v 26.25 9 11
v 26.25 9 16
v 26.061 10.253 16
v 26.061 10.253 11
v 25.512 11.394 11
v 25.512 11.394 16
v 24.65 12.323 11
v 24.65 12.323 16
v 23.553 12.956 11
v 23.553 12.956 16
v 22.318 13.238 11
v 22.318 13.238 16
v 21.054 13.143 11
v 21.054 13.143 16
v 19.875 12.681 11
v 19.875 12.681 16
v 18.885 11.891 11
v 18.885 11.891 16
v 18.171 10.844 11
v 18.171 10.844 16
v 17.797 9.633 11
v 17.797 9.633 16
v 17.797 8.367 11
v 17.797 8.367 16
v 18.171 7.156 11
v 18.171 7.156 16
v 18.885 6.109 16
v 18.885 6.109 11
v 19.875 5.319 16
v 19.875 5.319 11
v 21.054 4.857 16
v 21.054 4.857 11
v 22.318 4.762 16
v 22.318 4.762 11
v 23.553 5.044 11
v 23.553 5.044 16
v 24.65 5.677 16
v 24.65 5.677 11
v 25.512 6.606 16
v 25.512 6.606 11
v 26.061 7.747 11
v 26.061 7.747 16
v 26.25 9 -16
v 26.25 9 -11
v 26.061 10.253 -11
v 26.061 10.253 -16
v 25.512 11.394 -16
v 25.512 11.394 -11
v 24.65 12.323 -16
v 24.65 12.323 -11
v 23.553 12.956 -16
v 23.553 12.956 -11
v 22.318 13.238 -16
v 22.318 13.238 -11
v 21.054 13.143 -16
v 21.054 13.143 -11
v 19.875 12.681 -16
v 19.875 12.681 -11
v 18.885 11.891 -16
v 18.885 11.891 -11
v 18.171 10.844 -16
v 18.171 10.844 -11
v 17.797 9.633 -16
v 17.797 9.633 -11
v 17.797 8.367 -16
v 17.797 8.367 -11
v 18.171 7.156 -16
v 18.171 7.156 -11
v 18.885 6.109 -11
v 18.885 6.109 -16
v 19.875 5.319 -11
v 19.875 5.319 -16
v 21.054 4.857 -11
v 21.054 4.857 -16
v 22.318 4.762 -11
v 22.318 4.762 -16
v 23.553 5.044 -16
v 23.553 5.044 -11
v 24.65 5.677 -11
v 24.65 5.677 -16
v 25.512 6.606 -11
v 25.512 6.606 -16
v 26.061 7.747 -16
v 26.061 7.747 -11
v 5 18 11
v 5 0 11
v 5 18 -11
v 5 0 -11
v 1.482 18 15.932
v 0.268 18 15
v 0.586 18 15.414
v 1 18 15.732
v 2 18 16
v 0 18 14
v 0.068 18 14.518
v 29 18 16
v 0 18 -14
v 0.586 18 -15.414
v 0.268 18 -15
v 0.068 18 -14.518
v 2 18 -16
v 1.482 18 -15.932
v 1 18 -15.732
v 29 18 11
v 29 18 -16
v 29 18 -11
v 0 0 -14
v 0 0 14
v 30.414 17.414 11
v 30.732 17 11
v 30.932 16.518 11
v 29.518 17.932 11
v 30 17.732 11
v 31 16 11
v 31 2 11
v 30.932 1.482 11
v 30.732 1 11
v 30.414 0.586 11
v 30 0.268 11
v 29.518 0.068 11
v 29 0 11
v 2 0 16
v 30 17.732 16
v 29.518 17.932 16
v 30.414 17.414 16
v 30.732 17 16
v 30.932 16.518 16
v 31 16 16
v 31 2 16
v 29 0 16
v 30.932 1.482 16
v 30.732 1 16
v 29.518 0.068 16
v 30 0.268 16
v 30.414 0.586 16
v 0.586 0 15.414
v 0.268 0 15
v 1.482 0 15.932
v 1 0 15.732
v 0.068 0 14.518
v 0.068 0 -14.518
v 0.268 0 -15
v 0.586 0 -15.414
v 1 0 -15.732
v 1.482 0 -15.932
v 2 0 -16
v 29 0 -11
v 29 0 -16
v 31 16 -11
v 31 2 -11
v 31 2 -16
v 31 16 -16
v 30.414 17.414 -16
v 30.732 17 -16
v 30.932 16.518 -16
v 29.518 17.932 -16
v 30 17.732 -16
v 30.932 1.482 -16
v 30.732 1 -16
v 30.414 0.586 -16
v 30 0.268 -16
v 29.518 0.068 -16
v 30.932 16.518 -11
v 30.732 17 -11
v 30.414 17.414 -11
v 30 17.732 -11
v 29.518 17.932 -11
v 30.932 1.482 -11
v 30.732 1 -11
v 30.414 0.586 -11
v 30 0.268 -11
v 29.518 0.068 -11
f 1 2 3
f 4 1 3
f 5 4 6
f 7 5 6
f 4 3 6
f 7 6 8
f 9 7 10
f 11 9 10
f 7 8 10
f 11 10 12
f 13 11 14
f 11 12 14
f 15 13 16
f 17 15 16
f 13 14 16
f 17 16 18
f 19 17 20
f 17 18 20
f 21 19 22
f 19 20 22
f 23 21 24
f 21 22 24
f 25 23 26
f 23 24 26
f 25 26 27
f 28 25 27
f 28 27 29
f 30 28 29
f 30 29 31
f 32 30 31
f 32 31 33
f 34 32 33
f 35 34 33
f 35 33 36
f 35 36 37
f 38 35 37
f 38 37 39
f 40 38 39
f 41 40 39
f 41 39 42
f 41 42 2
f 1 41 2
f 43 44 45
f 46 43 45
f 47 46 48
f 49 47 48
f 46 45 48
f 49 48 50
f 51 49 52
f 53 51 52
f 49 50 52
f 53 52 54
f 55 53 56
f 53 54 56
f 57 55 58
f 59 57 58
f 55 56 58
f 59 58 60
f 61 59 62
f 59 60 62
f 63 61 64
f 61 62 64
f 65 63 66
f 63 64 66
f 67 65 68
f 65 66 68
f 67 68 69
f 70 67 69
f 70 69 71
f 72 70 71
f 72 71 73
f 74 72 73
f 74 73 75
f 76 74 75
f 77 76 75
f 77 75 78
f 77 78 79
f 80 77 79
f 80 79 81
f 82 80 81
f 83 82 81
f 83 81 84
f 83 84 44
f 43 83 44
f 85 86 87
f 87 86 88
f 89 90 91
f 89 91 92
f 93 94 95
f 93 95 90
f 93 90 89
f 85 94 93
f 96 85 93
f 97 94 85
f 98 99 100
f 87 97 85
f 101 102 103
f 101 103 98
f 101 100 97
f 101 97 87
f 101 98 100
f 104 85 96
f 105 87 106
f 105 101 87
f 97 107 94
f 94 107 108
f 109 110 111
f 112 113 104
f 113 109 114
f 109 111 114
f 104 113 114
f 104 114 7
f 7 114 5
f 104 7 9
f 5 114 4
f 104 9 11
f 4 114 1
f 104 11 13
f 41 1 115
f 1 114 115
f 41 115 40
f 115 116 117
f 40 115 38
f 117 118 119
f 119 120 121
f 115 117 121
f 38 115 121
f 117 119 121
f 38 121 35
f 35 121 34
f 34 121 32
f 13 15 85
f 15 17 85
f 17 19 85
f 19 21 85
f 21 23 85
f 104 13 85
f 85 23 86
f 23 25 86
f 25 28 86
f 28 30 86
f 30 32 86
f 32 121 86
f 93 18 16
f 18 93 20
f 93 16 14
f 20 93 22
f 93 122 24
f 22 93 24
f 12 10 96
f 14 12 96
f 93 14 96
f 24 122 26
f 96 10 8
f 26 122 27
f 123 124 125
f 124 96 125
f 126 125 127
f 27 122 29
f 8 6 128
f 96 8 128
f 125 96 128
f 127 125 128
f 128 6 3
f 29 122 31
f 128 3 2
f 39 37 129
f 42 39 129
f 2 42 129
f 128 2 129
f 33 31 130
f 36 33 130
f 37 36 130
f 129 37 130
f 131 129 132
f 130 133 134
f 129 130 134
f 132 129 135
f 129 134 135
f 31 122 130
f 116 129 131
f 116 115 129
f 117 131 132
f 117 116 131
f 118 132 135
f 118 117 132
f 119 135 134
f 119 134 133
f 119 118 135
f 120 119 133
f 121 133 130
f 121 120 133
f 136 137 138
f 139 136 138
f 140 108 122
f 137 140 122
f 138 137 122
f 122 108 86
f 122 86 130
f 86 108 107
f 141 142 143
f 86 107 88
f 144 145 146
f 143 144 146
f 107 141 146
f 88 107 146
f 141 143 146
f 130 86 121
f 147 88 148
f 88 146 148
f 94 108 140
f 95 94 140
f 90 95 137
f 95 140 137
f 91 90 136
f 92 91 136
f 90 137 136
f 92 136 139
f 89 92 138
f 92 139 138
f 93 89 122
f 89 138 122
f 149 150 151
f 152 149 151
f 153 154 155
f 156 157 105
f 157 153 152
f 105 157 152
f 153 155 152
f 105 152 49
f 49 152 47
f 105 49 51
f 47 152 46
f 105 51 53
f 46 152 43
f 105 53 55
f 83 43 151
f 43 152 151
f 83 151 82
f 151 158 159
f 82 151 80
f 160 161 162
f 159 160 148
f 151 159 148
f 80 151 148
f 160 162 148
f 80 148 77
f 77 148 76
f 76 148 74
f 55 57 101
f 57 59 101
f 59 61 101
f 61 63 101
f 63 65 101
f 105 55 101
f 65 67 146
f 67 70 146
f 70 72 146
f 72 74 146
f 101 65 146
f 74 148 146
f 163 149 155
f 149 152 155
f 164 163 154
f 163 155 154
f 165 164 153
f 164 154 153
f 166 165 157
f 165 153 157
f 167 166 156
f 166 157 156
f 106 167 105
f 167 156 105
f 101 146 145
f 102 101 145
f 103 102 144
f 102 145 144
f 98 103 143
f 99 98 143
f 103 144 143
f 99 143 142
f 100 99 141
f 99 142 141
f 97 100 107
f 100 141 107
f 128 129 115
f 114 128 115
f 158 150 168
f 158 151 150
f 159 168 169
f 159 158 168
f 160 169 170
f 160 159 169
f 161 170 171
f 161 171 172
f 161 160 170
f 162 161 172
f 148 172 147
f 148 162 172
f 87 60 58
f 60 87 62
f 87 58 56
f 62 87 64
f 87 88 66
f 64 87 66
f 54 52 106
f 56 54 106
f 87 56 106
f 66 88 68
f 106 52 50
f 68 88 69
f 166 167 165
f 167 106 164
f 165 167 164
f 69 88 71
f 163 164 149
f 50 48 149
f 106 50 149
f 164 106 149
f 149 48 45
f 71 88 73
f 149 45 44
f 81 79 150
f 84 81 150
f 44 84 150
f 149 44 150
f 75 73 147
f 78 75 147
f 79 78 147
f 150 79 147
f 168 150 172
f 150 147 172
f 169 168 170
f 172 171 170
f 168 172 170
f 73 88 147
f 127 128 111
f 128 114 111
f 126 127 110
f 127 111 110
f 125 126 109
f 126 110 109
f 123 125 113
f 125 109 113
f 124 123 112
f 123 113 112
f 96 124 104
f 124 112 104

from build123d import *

# Parameters (mm, degrees)
EXTRUDE_1_DEPTH     = 18
FILLET_1_R          = 2
SKETCH_2_R          = 4.25
CUT_EXTRUDE_1_DEPTH = 49.052055107


with BuildPart() as part:
    # Эскиз1 → Бобышка-Вытянуть1 (new body)
    with BuildSketch(Plane(origin=(0, 0, 0), x_dir=(1, 0, 0), z_dir=(0, 1, 0))):
        with BuildLine():
            Line((0, 14), (0, -14))
            ThreePointArc((0, -14), (0.585786438, -15.414213562), (2, -16))
            Line((2, -16), (31, -16))
            Line((31, -16), (31, -11))
            Line((31, -11), (5, -11))
            Line((5, -11), (5, 11))
            Line((5, 11), (31, 11))
            Line((31, 11), (31, 16))
            Line((31, 16), (2, 16))
            ThreePointArc((2, 16), (0.585786438, 15.414213562), (0, 14))
        make_face()
    extrude(amount=EXTRUDE_1_DEPTH)

    # Скругление1
    fillet_1_edges = [part.edges().sort_by_distance(p)[0] for p in [
        (31, 18, 13.5),
        (31, 0, -13.5),
        (31, 0, 13.5),
        (31, 18, -13.5),
    ]]
    fillet(fillet_1_edges, radius=FILLET_1_R)

    # Эскиз2 → Вырез-Вытянуть1 (cut, through all)
    with BuildSketch(Plane.XY.offset(16)):
        with Locations((22, 9)):
            Circle(SKETCH_2_R)
    extrude(amount=-CUT_EXTRUDE_1_DEPTH, mode=Mode.SUBTRACT)


solid = part.part
